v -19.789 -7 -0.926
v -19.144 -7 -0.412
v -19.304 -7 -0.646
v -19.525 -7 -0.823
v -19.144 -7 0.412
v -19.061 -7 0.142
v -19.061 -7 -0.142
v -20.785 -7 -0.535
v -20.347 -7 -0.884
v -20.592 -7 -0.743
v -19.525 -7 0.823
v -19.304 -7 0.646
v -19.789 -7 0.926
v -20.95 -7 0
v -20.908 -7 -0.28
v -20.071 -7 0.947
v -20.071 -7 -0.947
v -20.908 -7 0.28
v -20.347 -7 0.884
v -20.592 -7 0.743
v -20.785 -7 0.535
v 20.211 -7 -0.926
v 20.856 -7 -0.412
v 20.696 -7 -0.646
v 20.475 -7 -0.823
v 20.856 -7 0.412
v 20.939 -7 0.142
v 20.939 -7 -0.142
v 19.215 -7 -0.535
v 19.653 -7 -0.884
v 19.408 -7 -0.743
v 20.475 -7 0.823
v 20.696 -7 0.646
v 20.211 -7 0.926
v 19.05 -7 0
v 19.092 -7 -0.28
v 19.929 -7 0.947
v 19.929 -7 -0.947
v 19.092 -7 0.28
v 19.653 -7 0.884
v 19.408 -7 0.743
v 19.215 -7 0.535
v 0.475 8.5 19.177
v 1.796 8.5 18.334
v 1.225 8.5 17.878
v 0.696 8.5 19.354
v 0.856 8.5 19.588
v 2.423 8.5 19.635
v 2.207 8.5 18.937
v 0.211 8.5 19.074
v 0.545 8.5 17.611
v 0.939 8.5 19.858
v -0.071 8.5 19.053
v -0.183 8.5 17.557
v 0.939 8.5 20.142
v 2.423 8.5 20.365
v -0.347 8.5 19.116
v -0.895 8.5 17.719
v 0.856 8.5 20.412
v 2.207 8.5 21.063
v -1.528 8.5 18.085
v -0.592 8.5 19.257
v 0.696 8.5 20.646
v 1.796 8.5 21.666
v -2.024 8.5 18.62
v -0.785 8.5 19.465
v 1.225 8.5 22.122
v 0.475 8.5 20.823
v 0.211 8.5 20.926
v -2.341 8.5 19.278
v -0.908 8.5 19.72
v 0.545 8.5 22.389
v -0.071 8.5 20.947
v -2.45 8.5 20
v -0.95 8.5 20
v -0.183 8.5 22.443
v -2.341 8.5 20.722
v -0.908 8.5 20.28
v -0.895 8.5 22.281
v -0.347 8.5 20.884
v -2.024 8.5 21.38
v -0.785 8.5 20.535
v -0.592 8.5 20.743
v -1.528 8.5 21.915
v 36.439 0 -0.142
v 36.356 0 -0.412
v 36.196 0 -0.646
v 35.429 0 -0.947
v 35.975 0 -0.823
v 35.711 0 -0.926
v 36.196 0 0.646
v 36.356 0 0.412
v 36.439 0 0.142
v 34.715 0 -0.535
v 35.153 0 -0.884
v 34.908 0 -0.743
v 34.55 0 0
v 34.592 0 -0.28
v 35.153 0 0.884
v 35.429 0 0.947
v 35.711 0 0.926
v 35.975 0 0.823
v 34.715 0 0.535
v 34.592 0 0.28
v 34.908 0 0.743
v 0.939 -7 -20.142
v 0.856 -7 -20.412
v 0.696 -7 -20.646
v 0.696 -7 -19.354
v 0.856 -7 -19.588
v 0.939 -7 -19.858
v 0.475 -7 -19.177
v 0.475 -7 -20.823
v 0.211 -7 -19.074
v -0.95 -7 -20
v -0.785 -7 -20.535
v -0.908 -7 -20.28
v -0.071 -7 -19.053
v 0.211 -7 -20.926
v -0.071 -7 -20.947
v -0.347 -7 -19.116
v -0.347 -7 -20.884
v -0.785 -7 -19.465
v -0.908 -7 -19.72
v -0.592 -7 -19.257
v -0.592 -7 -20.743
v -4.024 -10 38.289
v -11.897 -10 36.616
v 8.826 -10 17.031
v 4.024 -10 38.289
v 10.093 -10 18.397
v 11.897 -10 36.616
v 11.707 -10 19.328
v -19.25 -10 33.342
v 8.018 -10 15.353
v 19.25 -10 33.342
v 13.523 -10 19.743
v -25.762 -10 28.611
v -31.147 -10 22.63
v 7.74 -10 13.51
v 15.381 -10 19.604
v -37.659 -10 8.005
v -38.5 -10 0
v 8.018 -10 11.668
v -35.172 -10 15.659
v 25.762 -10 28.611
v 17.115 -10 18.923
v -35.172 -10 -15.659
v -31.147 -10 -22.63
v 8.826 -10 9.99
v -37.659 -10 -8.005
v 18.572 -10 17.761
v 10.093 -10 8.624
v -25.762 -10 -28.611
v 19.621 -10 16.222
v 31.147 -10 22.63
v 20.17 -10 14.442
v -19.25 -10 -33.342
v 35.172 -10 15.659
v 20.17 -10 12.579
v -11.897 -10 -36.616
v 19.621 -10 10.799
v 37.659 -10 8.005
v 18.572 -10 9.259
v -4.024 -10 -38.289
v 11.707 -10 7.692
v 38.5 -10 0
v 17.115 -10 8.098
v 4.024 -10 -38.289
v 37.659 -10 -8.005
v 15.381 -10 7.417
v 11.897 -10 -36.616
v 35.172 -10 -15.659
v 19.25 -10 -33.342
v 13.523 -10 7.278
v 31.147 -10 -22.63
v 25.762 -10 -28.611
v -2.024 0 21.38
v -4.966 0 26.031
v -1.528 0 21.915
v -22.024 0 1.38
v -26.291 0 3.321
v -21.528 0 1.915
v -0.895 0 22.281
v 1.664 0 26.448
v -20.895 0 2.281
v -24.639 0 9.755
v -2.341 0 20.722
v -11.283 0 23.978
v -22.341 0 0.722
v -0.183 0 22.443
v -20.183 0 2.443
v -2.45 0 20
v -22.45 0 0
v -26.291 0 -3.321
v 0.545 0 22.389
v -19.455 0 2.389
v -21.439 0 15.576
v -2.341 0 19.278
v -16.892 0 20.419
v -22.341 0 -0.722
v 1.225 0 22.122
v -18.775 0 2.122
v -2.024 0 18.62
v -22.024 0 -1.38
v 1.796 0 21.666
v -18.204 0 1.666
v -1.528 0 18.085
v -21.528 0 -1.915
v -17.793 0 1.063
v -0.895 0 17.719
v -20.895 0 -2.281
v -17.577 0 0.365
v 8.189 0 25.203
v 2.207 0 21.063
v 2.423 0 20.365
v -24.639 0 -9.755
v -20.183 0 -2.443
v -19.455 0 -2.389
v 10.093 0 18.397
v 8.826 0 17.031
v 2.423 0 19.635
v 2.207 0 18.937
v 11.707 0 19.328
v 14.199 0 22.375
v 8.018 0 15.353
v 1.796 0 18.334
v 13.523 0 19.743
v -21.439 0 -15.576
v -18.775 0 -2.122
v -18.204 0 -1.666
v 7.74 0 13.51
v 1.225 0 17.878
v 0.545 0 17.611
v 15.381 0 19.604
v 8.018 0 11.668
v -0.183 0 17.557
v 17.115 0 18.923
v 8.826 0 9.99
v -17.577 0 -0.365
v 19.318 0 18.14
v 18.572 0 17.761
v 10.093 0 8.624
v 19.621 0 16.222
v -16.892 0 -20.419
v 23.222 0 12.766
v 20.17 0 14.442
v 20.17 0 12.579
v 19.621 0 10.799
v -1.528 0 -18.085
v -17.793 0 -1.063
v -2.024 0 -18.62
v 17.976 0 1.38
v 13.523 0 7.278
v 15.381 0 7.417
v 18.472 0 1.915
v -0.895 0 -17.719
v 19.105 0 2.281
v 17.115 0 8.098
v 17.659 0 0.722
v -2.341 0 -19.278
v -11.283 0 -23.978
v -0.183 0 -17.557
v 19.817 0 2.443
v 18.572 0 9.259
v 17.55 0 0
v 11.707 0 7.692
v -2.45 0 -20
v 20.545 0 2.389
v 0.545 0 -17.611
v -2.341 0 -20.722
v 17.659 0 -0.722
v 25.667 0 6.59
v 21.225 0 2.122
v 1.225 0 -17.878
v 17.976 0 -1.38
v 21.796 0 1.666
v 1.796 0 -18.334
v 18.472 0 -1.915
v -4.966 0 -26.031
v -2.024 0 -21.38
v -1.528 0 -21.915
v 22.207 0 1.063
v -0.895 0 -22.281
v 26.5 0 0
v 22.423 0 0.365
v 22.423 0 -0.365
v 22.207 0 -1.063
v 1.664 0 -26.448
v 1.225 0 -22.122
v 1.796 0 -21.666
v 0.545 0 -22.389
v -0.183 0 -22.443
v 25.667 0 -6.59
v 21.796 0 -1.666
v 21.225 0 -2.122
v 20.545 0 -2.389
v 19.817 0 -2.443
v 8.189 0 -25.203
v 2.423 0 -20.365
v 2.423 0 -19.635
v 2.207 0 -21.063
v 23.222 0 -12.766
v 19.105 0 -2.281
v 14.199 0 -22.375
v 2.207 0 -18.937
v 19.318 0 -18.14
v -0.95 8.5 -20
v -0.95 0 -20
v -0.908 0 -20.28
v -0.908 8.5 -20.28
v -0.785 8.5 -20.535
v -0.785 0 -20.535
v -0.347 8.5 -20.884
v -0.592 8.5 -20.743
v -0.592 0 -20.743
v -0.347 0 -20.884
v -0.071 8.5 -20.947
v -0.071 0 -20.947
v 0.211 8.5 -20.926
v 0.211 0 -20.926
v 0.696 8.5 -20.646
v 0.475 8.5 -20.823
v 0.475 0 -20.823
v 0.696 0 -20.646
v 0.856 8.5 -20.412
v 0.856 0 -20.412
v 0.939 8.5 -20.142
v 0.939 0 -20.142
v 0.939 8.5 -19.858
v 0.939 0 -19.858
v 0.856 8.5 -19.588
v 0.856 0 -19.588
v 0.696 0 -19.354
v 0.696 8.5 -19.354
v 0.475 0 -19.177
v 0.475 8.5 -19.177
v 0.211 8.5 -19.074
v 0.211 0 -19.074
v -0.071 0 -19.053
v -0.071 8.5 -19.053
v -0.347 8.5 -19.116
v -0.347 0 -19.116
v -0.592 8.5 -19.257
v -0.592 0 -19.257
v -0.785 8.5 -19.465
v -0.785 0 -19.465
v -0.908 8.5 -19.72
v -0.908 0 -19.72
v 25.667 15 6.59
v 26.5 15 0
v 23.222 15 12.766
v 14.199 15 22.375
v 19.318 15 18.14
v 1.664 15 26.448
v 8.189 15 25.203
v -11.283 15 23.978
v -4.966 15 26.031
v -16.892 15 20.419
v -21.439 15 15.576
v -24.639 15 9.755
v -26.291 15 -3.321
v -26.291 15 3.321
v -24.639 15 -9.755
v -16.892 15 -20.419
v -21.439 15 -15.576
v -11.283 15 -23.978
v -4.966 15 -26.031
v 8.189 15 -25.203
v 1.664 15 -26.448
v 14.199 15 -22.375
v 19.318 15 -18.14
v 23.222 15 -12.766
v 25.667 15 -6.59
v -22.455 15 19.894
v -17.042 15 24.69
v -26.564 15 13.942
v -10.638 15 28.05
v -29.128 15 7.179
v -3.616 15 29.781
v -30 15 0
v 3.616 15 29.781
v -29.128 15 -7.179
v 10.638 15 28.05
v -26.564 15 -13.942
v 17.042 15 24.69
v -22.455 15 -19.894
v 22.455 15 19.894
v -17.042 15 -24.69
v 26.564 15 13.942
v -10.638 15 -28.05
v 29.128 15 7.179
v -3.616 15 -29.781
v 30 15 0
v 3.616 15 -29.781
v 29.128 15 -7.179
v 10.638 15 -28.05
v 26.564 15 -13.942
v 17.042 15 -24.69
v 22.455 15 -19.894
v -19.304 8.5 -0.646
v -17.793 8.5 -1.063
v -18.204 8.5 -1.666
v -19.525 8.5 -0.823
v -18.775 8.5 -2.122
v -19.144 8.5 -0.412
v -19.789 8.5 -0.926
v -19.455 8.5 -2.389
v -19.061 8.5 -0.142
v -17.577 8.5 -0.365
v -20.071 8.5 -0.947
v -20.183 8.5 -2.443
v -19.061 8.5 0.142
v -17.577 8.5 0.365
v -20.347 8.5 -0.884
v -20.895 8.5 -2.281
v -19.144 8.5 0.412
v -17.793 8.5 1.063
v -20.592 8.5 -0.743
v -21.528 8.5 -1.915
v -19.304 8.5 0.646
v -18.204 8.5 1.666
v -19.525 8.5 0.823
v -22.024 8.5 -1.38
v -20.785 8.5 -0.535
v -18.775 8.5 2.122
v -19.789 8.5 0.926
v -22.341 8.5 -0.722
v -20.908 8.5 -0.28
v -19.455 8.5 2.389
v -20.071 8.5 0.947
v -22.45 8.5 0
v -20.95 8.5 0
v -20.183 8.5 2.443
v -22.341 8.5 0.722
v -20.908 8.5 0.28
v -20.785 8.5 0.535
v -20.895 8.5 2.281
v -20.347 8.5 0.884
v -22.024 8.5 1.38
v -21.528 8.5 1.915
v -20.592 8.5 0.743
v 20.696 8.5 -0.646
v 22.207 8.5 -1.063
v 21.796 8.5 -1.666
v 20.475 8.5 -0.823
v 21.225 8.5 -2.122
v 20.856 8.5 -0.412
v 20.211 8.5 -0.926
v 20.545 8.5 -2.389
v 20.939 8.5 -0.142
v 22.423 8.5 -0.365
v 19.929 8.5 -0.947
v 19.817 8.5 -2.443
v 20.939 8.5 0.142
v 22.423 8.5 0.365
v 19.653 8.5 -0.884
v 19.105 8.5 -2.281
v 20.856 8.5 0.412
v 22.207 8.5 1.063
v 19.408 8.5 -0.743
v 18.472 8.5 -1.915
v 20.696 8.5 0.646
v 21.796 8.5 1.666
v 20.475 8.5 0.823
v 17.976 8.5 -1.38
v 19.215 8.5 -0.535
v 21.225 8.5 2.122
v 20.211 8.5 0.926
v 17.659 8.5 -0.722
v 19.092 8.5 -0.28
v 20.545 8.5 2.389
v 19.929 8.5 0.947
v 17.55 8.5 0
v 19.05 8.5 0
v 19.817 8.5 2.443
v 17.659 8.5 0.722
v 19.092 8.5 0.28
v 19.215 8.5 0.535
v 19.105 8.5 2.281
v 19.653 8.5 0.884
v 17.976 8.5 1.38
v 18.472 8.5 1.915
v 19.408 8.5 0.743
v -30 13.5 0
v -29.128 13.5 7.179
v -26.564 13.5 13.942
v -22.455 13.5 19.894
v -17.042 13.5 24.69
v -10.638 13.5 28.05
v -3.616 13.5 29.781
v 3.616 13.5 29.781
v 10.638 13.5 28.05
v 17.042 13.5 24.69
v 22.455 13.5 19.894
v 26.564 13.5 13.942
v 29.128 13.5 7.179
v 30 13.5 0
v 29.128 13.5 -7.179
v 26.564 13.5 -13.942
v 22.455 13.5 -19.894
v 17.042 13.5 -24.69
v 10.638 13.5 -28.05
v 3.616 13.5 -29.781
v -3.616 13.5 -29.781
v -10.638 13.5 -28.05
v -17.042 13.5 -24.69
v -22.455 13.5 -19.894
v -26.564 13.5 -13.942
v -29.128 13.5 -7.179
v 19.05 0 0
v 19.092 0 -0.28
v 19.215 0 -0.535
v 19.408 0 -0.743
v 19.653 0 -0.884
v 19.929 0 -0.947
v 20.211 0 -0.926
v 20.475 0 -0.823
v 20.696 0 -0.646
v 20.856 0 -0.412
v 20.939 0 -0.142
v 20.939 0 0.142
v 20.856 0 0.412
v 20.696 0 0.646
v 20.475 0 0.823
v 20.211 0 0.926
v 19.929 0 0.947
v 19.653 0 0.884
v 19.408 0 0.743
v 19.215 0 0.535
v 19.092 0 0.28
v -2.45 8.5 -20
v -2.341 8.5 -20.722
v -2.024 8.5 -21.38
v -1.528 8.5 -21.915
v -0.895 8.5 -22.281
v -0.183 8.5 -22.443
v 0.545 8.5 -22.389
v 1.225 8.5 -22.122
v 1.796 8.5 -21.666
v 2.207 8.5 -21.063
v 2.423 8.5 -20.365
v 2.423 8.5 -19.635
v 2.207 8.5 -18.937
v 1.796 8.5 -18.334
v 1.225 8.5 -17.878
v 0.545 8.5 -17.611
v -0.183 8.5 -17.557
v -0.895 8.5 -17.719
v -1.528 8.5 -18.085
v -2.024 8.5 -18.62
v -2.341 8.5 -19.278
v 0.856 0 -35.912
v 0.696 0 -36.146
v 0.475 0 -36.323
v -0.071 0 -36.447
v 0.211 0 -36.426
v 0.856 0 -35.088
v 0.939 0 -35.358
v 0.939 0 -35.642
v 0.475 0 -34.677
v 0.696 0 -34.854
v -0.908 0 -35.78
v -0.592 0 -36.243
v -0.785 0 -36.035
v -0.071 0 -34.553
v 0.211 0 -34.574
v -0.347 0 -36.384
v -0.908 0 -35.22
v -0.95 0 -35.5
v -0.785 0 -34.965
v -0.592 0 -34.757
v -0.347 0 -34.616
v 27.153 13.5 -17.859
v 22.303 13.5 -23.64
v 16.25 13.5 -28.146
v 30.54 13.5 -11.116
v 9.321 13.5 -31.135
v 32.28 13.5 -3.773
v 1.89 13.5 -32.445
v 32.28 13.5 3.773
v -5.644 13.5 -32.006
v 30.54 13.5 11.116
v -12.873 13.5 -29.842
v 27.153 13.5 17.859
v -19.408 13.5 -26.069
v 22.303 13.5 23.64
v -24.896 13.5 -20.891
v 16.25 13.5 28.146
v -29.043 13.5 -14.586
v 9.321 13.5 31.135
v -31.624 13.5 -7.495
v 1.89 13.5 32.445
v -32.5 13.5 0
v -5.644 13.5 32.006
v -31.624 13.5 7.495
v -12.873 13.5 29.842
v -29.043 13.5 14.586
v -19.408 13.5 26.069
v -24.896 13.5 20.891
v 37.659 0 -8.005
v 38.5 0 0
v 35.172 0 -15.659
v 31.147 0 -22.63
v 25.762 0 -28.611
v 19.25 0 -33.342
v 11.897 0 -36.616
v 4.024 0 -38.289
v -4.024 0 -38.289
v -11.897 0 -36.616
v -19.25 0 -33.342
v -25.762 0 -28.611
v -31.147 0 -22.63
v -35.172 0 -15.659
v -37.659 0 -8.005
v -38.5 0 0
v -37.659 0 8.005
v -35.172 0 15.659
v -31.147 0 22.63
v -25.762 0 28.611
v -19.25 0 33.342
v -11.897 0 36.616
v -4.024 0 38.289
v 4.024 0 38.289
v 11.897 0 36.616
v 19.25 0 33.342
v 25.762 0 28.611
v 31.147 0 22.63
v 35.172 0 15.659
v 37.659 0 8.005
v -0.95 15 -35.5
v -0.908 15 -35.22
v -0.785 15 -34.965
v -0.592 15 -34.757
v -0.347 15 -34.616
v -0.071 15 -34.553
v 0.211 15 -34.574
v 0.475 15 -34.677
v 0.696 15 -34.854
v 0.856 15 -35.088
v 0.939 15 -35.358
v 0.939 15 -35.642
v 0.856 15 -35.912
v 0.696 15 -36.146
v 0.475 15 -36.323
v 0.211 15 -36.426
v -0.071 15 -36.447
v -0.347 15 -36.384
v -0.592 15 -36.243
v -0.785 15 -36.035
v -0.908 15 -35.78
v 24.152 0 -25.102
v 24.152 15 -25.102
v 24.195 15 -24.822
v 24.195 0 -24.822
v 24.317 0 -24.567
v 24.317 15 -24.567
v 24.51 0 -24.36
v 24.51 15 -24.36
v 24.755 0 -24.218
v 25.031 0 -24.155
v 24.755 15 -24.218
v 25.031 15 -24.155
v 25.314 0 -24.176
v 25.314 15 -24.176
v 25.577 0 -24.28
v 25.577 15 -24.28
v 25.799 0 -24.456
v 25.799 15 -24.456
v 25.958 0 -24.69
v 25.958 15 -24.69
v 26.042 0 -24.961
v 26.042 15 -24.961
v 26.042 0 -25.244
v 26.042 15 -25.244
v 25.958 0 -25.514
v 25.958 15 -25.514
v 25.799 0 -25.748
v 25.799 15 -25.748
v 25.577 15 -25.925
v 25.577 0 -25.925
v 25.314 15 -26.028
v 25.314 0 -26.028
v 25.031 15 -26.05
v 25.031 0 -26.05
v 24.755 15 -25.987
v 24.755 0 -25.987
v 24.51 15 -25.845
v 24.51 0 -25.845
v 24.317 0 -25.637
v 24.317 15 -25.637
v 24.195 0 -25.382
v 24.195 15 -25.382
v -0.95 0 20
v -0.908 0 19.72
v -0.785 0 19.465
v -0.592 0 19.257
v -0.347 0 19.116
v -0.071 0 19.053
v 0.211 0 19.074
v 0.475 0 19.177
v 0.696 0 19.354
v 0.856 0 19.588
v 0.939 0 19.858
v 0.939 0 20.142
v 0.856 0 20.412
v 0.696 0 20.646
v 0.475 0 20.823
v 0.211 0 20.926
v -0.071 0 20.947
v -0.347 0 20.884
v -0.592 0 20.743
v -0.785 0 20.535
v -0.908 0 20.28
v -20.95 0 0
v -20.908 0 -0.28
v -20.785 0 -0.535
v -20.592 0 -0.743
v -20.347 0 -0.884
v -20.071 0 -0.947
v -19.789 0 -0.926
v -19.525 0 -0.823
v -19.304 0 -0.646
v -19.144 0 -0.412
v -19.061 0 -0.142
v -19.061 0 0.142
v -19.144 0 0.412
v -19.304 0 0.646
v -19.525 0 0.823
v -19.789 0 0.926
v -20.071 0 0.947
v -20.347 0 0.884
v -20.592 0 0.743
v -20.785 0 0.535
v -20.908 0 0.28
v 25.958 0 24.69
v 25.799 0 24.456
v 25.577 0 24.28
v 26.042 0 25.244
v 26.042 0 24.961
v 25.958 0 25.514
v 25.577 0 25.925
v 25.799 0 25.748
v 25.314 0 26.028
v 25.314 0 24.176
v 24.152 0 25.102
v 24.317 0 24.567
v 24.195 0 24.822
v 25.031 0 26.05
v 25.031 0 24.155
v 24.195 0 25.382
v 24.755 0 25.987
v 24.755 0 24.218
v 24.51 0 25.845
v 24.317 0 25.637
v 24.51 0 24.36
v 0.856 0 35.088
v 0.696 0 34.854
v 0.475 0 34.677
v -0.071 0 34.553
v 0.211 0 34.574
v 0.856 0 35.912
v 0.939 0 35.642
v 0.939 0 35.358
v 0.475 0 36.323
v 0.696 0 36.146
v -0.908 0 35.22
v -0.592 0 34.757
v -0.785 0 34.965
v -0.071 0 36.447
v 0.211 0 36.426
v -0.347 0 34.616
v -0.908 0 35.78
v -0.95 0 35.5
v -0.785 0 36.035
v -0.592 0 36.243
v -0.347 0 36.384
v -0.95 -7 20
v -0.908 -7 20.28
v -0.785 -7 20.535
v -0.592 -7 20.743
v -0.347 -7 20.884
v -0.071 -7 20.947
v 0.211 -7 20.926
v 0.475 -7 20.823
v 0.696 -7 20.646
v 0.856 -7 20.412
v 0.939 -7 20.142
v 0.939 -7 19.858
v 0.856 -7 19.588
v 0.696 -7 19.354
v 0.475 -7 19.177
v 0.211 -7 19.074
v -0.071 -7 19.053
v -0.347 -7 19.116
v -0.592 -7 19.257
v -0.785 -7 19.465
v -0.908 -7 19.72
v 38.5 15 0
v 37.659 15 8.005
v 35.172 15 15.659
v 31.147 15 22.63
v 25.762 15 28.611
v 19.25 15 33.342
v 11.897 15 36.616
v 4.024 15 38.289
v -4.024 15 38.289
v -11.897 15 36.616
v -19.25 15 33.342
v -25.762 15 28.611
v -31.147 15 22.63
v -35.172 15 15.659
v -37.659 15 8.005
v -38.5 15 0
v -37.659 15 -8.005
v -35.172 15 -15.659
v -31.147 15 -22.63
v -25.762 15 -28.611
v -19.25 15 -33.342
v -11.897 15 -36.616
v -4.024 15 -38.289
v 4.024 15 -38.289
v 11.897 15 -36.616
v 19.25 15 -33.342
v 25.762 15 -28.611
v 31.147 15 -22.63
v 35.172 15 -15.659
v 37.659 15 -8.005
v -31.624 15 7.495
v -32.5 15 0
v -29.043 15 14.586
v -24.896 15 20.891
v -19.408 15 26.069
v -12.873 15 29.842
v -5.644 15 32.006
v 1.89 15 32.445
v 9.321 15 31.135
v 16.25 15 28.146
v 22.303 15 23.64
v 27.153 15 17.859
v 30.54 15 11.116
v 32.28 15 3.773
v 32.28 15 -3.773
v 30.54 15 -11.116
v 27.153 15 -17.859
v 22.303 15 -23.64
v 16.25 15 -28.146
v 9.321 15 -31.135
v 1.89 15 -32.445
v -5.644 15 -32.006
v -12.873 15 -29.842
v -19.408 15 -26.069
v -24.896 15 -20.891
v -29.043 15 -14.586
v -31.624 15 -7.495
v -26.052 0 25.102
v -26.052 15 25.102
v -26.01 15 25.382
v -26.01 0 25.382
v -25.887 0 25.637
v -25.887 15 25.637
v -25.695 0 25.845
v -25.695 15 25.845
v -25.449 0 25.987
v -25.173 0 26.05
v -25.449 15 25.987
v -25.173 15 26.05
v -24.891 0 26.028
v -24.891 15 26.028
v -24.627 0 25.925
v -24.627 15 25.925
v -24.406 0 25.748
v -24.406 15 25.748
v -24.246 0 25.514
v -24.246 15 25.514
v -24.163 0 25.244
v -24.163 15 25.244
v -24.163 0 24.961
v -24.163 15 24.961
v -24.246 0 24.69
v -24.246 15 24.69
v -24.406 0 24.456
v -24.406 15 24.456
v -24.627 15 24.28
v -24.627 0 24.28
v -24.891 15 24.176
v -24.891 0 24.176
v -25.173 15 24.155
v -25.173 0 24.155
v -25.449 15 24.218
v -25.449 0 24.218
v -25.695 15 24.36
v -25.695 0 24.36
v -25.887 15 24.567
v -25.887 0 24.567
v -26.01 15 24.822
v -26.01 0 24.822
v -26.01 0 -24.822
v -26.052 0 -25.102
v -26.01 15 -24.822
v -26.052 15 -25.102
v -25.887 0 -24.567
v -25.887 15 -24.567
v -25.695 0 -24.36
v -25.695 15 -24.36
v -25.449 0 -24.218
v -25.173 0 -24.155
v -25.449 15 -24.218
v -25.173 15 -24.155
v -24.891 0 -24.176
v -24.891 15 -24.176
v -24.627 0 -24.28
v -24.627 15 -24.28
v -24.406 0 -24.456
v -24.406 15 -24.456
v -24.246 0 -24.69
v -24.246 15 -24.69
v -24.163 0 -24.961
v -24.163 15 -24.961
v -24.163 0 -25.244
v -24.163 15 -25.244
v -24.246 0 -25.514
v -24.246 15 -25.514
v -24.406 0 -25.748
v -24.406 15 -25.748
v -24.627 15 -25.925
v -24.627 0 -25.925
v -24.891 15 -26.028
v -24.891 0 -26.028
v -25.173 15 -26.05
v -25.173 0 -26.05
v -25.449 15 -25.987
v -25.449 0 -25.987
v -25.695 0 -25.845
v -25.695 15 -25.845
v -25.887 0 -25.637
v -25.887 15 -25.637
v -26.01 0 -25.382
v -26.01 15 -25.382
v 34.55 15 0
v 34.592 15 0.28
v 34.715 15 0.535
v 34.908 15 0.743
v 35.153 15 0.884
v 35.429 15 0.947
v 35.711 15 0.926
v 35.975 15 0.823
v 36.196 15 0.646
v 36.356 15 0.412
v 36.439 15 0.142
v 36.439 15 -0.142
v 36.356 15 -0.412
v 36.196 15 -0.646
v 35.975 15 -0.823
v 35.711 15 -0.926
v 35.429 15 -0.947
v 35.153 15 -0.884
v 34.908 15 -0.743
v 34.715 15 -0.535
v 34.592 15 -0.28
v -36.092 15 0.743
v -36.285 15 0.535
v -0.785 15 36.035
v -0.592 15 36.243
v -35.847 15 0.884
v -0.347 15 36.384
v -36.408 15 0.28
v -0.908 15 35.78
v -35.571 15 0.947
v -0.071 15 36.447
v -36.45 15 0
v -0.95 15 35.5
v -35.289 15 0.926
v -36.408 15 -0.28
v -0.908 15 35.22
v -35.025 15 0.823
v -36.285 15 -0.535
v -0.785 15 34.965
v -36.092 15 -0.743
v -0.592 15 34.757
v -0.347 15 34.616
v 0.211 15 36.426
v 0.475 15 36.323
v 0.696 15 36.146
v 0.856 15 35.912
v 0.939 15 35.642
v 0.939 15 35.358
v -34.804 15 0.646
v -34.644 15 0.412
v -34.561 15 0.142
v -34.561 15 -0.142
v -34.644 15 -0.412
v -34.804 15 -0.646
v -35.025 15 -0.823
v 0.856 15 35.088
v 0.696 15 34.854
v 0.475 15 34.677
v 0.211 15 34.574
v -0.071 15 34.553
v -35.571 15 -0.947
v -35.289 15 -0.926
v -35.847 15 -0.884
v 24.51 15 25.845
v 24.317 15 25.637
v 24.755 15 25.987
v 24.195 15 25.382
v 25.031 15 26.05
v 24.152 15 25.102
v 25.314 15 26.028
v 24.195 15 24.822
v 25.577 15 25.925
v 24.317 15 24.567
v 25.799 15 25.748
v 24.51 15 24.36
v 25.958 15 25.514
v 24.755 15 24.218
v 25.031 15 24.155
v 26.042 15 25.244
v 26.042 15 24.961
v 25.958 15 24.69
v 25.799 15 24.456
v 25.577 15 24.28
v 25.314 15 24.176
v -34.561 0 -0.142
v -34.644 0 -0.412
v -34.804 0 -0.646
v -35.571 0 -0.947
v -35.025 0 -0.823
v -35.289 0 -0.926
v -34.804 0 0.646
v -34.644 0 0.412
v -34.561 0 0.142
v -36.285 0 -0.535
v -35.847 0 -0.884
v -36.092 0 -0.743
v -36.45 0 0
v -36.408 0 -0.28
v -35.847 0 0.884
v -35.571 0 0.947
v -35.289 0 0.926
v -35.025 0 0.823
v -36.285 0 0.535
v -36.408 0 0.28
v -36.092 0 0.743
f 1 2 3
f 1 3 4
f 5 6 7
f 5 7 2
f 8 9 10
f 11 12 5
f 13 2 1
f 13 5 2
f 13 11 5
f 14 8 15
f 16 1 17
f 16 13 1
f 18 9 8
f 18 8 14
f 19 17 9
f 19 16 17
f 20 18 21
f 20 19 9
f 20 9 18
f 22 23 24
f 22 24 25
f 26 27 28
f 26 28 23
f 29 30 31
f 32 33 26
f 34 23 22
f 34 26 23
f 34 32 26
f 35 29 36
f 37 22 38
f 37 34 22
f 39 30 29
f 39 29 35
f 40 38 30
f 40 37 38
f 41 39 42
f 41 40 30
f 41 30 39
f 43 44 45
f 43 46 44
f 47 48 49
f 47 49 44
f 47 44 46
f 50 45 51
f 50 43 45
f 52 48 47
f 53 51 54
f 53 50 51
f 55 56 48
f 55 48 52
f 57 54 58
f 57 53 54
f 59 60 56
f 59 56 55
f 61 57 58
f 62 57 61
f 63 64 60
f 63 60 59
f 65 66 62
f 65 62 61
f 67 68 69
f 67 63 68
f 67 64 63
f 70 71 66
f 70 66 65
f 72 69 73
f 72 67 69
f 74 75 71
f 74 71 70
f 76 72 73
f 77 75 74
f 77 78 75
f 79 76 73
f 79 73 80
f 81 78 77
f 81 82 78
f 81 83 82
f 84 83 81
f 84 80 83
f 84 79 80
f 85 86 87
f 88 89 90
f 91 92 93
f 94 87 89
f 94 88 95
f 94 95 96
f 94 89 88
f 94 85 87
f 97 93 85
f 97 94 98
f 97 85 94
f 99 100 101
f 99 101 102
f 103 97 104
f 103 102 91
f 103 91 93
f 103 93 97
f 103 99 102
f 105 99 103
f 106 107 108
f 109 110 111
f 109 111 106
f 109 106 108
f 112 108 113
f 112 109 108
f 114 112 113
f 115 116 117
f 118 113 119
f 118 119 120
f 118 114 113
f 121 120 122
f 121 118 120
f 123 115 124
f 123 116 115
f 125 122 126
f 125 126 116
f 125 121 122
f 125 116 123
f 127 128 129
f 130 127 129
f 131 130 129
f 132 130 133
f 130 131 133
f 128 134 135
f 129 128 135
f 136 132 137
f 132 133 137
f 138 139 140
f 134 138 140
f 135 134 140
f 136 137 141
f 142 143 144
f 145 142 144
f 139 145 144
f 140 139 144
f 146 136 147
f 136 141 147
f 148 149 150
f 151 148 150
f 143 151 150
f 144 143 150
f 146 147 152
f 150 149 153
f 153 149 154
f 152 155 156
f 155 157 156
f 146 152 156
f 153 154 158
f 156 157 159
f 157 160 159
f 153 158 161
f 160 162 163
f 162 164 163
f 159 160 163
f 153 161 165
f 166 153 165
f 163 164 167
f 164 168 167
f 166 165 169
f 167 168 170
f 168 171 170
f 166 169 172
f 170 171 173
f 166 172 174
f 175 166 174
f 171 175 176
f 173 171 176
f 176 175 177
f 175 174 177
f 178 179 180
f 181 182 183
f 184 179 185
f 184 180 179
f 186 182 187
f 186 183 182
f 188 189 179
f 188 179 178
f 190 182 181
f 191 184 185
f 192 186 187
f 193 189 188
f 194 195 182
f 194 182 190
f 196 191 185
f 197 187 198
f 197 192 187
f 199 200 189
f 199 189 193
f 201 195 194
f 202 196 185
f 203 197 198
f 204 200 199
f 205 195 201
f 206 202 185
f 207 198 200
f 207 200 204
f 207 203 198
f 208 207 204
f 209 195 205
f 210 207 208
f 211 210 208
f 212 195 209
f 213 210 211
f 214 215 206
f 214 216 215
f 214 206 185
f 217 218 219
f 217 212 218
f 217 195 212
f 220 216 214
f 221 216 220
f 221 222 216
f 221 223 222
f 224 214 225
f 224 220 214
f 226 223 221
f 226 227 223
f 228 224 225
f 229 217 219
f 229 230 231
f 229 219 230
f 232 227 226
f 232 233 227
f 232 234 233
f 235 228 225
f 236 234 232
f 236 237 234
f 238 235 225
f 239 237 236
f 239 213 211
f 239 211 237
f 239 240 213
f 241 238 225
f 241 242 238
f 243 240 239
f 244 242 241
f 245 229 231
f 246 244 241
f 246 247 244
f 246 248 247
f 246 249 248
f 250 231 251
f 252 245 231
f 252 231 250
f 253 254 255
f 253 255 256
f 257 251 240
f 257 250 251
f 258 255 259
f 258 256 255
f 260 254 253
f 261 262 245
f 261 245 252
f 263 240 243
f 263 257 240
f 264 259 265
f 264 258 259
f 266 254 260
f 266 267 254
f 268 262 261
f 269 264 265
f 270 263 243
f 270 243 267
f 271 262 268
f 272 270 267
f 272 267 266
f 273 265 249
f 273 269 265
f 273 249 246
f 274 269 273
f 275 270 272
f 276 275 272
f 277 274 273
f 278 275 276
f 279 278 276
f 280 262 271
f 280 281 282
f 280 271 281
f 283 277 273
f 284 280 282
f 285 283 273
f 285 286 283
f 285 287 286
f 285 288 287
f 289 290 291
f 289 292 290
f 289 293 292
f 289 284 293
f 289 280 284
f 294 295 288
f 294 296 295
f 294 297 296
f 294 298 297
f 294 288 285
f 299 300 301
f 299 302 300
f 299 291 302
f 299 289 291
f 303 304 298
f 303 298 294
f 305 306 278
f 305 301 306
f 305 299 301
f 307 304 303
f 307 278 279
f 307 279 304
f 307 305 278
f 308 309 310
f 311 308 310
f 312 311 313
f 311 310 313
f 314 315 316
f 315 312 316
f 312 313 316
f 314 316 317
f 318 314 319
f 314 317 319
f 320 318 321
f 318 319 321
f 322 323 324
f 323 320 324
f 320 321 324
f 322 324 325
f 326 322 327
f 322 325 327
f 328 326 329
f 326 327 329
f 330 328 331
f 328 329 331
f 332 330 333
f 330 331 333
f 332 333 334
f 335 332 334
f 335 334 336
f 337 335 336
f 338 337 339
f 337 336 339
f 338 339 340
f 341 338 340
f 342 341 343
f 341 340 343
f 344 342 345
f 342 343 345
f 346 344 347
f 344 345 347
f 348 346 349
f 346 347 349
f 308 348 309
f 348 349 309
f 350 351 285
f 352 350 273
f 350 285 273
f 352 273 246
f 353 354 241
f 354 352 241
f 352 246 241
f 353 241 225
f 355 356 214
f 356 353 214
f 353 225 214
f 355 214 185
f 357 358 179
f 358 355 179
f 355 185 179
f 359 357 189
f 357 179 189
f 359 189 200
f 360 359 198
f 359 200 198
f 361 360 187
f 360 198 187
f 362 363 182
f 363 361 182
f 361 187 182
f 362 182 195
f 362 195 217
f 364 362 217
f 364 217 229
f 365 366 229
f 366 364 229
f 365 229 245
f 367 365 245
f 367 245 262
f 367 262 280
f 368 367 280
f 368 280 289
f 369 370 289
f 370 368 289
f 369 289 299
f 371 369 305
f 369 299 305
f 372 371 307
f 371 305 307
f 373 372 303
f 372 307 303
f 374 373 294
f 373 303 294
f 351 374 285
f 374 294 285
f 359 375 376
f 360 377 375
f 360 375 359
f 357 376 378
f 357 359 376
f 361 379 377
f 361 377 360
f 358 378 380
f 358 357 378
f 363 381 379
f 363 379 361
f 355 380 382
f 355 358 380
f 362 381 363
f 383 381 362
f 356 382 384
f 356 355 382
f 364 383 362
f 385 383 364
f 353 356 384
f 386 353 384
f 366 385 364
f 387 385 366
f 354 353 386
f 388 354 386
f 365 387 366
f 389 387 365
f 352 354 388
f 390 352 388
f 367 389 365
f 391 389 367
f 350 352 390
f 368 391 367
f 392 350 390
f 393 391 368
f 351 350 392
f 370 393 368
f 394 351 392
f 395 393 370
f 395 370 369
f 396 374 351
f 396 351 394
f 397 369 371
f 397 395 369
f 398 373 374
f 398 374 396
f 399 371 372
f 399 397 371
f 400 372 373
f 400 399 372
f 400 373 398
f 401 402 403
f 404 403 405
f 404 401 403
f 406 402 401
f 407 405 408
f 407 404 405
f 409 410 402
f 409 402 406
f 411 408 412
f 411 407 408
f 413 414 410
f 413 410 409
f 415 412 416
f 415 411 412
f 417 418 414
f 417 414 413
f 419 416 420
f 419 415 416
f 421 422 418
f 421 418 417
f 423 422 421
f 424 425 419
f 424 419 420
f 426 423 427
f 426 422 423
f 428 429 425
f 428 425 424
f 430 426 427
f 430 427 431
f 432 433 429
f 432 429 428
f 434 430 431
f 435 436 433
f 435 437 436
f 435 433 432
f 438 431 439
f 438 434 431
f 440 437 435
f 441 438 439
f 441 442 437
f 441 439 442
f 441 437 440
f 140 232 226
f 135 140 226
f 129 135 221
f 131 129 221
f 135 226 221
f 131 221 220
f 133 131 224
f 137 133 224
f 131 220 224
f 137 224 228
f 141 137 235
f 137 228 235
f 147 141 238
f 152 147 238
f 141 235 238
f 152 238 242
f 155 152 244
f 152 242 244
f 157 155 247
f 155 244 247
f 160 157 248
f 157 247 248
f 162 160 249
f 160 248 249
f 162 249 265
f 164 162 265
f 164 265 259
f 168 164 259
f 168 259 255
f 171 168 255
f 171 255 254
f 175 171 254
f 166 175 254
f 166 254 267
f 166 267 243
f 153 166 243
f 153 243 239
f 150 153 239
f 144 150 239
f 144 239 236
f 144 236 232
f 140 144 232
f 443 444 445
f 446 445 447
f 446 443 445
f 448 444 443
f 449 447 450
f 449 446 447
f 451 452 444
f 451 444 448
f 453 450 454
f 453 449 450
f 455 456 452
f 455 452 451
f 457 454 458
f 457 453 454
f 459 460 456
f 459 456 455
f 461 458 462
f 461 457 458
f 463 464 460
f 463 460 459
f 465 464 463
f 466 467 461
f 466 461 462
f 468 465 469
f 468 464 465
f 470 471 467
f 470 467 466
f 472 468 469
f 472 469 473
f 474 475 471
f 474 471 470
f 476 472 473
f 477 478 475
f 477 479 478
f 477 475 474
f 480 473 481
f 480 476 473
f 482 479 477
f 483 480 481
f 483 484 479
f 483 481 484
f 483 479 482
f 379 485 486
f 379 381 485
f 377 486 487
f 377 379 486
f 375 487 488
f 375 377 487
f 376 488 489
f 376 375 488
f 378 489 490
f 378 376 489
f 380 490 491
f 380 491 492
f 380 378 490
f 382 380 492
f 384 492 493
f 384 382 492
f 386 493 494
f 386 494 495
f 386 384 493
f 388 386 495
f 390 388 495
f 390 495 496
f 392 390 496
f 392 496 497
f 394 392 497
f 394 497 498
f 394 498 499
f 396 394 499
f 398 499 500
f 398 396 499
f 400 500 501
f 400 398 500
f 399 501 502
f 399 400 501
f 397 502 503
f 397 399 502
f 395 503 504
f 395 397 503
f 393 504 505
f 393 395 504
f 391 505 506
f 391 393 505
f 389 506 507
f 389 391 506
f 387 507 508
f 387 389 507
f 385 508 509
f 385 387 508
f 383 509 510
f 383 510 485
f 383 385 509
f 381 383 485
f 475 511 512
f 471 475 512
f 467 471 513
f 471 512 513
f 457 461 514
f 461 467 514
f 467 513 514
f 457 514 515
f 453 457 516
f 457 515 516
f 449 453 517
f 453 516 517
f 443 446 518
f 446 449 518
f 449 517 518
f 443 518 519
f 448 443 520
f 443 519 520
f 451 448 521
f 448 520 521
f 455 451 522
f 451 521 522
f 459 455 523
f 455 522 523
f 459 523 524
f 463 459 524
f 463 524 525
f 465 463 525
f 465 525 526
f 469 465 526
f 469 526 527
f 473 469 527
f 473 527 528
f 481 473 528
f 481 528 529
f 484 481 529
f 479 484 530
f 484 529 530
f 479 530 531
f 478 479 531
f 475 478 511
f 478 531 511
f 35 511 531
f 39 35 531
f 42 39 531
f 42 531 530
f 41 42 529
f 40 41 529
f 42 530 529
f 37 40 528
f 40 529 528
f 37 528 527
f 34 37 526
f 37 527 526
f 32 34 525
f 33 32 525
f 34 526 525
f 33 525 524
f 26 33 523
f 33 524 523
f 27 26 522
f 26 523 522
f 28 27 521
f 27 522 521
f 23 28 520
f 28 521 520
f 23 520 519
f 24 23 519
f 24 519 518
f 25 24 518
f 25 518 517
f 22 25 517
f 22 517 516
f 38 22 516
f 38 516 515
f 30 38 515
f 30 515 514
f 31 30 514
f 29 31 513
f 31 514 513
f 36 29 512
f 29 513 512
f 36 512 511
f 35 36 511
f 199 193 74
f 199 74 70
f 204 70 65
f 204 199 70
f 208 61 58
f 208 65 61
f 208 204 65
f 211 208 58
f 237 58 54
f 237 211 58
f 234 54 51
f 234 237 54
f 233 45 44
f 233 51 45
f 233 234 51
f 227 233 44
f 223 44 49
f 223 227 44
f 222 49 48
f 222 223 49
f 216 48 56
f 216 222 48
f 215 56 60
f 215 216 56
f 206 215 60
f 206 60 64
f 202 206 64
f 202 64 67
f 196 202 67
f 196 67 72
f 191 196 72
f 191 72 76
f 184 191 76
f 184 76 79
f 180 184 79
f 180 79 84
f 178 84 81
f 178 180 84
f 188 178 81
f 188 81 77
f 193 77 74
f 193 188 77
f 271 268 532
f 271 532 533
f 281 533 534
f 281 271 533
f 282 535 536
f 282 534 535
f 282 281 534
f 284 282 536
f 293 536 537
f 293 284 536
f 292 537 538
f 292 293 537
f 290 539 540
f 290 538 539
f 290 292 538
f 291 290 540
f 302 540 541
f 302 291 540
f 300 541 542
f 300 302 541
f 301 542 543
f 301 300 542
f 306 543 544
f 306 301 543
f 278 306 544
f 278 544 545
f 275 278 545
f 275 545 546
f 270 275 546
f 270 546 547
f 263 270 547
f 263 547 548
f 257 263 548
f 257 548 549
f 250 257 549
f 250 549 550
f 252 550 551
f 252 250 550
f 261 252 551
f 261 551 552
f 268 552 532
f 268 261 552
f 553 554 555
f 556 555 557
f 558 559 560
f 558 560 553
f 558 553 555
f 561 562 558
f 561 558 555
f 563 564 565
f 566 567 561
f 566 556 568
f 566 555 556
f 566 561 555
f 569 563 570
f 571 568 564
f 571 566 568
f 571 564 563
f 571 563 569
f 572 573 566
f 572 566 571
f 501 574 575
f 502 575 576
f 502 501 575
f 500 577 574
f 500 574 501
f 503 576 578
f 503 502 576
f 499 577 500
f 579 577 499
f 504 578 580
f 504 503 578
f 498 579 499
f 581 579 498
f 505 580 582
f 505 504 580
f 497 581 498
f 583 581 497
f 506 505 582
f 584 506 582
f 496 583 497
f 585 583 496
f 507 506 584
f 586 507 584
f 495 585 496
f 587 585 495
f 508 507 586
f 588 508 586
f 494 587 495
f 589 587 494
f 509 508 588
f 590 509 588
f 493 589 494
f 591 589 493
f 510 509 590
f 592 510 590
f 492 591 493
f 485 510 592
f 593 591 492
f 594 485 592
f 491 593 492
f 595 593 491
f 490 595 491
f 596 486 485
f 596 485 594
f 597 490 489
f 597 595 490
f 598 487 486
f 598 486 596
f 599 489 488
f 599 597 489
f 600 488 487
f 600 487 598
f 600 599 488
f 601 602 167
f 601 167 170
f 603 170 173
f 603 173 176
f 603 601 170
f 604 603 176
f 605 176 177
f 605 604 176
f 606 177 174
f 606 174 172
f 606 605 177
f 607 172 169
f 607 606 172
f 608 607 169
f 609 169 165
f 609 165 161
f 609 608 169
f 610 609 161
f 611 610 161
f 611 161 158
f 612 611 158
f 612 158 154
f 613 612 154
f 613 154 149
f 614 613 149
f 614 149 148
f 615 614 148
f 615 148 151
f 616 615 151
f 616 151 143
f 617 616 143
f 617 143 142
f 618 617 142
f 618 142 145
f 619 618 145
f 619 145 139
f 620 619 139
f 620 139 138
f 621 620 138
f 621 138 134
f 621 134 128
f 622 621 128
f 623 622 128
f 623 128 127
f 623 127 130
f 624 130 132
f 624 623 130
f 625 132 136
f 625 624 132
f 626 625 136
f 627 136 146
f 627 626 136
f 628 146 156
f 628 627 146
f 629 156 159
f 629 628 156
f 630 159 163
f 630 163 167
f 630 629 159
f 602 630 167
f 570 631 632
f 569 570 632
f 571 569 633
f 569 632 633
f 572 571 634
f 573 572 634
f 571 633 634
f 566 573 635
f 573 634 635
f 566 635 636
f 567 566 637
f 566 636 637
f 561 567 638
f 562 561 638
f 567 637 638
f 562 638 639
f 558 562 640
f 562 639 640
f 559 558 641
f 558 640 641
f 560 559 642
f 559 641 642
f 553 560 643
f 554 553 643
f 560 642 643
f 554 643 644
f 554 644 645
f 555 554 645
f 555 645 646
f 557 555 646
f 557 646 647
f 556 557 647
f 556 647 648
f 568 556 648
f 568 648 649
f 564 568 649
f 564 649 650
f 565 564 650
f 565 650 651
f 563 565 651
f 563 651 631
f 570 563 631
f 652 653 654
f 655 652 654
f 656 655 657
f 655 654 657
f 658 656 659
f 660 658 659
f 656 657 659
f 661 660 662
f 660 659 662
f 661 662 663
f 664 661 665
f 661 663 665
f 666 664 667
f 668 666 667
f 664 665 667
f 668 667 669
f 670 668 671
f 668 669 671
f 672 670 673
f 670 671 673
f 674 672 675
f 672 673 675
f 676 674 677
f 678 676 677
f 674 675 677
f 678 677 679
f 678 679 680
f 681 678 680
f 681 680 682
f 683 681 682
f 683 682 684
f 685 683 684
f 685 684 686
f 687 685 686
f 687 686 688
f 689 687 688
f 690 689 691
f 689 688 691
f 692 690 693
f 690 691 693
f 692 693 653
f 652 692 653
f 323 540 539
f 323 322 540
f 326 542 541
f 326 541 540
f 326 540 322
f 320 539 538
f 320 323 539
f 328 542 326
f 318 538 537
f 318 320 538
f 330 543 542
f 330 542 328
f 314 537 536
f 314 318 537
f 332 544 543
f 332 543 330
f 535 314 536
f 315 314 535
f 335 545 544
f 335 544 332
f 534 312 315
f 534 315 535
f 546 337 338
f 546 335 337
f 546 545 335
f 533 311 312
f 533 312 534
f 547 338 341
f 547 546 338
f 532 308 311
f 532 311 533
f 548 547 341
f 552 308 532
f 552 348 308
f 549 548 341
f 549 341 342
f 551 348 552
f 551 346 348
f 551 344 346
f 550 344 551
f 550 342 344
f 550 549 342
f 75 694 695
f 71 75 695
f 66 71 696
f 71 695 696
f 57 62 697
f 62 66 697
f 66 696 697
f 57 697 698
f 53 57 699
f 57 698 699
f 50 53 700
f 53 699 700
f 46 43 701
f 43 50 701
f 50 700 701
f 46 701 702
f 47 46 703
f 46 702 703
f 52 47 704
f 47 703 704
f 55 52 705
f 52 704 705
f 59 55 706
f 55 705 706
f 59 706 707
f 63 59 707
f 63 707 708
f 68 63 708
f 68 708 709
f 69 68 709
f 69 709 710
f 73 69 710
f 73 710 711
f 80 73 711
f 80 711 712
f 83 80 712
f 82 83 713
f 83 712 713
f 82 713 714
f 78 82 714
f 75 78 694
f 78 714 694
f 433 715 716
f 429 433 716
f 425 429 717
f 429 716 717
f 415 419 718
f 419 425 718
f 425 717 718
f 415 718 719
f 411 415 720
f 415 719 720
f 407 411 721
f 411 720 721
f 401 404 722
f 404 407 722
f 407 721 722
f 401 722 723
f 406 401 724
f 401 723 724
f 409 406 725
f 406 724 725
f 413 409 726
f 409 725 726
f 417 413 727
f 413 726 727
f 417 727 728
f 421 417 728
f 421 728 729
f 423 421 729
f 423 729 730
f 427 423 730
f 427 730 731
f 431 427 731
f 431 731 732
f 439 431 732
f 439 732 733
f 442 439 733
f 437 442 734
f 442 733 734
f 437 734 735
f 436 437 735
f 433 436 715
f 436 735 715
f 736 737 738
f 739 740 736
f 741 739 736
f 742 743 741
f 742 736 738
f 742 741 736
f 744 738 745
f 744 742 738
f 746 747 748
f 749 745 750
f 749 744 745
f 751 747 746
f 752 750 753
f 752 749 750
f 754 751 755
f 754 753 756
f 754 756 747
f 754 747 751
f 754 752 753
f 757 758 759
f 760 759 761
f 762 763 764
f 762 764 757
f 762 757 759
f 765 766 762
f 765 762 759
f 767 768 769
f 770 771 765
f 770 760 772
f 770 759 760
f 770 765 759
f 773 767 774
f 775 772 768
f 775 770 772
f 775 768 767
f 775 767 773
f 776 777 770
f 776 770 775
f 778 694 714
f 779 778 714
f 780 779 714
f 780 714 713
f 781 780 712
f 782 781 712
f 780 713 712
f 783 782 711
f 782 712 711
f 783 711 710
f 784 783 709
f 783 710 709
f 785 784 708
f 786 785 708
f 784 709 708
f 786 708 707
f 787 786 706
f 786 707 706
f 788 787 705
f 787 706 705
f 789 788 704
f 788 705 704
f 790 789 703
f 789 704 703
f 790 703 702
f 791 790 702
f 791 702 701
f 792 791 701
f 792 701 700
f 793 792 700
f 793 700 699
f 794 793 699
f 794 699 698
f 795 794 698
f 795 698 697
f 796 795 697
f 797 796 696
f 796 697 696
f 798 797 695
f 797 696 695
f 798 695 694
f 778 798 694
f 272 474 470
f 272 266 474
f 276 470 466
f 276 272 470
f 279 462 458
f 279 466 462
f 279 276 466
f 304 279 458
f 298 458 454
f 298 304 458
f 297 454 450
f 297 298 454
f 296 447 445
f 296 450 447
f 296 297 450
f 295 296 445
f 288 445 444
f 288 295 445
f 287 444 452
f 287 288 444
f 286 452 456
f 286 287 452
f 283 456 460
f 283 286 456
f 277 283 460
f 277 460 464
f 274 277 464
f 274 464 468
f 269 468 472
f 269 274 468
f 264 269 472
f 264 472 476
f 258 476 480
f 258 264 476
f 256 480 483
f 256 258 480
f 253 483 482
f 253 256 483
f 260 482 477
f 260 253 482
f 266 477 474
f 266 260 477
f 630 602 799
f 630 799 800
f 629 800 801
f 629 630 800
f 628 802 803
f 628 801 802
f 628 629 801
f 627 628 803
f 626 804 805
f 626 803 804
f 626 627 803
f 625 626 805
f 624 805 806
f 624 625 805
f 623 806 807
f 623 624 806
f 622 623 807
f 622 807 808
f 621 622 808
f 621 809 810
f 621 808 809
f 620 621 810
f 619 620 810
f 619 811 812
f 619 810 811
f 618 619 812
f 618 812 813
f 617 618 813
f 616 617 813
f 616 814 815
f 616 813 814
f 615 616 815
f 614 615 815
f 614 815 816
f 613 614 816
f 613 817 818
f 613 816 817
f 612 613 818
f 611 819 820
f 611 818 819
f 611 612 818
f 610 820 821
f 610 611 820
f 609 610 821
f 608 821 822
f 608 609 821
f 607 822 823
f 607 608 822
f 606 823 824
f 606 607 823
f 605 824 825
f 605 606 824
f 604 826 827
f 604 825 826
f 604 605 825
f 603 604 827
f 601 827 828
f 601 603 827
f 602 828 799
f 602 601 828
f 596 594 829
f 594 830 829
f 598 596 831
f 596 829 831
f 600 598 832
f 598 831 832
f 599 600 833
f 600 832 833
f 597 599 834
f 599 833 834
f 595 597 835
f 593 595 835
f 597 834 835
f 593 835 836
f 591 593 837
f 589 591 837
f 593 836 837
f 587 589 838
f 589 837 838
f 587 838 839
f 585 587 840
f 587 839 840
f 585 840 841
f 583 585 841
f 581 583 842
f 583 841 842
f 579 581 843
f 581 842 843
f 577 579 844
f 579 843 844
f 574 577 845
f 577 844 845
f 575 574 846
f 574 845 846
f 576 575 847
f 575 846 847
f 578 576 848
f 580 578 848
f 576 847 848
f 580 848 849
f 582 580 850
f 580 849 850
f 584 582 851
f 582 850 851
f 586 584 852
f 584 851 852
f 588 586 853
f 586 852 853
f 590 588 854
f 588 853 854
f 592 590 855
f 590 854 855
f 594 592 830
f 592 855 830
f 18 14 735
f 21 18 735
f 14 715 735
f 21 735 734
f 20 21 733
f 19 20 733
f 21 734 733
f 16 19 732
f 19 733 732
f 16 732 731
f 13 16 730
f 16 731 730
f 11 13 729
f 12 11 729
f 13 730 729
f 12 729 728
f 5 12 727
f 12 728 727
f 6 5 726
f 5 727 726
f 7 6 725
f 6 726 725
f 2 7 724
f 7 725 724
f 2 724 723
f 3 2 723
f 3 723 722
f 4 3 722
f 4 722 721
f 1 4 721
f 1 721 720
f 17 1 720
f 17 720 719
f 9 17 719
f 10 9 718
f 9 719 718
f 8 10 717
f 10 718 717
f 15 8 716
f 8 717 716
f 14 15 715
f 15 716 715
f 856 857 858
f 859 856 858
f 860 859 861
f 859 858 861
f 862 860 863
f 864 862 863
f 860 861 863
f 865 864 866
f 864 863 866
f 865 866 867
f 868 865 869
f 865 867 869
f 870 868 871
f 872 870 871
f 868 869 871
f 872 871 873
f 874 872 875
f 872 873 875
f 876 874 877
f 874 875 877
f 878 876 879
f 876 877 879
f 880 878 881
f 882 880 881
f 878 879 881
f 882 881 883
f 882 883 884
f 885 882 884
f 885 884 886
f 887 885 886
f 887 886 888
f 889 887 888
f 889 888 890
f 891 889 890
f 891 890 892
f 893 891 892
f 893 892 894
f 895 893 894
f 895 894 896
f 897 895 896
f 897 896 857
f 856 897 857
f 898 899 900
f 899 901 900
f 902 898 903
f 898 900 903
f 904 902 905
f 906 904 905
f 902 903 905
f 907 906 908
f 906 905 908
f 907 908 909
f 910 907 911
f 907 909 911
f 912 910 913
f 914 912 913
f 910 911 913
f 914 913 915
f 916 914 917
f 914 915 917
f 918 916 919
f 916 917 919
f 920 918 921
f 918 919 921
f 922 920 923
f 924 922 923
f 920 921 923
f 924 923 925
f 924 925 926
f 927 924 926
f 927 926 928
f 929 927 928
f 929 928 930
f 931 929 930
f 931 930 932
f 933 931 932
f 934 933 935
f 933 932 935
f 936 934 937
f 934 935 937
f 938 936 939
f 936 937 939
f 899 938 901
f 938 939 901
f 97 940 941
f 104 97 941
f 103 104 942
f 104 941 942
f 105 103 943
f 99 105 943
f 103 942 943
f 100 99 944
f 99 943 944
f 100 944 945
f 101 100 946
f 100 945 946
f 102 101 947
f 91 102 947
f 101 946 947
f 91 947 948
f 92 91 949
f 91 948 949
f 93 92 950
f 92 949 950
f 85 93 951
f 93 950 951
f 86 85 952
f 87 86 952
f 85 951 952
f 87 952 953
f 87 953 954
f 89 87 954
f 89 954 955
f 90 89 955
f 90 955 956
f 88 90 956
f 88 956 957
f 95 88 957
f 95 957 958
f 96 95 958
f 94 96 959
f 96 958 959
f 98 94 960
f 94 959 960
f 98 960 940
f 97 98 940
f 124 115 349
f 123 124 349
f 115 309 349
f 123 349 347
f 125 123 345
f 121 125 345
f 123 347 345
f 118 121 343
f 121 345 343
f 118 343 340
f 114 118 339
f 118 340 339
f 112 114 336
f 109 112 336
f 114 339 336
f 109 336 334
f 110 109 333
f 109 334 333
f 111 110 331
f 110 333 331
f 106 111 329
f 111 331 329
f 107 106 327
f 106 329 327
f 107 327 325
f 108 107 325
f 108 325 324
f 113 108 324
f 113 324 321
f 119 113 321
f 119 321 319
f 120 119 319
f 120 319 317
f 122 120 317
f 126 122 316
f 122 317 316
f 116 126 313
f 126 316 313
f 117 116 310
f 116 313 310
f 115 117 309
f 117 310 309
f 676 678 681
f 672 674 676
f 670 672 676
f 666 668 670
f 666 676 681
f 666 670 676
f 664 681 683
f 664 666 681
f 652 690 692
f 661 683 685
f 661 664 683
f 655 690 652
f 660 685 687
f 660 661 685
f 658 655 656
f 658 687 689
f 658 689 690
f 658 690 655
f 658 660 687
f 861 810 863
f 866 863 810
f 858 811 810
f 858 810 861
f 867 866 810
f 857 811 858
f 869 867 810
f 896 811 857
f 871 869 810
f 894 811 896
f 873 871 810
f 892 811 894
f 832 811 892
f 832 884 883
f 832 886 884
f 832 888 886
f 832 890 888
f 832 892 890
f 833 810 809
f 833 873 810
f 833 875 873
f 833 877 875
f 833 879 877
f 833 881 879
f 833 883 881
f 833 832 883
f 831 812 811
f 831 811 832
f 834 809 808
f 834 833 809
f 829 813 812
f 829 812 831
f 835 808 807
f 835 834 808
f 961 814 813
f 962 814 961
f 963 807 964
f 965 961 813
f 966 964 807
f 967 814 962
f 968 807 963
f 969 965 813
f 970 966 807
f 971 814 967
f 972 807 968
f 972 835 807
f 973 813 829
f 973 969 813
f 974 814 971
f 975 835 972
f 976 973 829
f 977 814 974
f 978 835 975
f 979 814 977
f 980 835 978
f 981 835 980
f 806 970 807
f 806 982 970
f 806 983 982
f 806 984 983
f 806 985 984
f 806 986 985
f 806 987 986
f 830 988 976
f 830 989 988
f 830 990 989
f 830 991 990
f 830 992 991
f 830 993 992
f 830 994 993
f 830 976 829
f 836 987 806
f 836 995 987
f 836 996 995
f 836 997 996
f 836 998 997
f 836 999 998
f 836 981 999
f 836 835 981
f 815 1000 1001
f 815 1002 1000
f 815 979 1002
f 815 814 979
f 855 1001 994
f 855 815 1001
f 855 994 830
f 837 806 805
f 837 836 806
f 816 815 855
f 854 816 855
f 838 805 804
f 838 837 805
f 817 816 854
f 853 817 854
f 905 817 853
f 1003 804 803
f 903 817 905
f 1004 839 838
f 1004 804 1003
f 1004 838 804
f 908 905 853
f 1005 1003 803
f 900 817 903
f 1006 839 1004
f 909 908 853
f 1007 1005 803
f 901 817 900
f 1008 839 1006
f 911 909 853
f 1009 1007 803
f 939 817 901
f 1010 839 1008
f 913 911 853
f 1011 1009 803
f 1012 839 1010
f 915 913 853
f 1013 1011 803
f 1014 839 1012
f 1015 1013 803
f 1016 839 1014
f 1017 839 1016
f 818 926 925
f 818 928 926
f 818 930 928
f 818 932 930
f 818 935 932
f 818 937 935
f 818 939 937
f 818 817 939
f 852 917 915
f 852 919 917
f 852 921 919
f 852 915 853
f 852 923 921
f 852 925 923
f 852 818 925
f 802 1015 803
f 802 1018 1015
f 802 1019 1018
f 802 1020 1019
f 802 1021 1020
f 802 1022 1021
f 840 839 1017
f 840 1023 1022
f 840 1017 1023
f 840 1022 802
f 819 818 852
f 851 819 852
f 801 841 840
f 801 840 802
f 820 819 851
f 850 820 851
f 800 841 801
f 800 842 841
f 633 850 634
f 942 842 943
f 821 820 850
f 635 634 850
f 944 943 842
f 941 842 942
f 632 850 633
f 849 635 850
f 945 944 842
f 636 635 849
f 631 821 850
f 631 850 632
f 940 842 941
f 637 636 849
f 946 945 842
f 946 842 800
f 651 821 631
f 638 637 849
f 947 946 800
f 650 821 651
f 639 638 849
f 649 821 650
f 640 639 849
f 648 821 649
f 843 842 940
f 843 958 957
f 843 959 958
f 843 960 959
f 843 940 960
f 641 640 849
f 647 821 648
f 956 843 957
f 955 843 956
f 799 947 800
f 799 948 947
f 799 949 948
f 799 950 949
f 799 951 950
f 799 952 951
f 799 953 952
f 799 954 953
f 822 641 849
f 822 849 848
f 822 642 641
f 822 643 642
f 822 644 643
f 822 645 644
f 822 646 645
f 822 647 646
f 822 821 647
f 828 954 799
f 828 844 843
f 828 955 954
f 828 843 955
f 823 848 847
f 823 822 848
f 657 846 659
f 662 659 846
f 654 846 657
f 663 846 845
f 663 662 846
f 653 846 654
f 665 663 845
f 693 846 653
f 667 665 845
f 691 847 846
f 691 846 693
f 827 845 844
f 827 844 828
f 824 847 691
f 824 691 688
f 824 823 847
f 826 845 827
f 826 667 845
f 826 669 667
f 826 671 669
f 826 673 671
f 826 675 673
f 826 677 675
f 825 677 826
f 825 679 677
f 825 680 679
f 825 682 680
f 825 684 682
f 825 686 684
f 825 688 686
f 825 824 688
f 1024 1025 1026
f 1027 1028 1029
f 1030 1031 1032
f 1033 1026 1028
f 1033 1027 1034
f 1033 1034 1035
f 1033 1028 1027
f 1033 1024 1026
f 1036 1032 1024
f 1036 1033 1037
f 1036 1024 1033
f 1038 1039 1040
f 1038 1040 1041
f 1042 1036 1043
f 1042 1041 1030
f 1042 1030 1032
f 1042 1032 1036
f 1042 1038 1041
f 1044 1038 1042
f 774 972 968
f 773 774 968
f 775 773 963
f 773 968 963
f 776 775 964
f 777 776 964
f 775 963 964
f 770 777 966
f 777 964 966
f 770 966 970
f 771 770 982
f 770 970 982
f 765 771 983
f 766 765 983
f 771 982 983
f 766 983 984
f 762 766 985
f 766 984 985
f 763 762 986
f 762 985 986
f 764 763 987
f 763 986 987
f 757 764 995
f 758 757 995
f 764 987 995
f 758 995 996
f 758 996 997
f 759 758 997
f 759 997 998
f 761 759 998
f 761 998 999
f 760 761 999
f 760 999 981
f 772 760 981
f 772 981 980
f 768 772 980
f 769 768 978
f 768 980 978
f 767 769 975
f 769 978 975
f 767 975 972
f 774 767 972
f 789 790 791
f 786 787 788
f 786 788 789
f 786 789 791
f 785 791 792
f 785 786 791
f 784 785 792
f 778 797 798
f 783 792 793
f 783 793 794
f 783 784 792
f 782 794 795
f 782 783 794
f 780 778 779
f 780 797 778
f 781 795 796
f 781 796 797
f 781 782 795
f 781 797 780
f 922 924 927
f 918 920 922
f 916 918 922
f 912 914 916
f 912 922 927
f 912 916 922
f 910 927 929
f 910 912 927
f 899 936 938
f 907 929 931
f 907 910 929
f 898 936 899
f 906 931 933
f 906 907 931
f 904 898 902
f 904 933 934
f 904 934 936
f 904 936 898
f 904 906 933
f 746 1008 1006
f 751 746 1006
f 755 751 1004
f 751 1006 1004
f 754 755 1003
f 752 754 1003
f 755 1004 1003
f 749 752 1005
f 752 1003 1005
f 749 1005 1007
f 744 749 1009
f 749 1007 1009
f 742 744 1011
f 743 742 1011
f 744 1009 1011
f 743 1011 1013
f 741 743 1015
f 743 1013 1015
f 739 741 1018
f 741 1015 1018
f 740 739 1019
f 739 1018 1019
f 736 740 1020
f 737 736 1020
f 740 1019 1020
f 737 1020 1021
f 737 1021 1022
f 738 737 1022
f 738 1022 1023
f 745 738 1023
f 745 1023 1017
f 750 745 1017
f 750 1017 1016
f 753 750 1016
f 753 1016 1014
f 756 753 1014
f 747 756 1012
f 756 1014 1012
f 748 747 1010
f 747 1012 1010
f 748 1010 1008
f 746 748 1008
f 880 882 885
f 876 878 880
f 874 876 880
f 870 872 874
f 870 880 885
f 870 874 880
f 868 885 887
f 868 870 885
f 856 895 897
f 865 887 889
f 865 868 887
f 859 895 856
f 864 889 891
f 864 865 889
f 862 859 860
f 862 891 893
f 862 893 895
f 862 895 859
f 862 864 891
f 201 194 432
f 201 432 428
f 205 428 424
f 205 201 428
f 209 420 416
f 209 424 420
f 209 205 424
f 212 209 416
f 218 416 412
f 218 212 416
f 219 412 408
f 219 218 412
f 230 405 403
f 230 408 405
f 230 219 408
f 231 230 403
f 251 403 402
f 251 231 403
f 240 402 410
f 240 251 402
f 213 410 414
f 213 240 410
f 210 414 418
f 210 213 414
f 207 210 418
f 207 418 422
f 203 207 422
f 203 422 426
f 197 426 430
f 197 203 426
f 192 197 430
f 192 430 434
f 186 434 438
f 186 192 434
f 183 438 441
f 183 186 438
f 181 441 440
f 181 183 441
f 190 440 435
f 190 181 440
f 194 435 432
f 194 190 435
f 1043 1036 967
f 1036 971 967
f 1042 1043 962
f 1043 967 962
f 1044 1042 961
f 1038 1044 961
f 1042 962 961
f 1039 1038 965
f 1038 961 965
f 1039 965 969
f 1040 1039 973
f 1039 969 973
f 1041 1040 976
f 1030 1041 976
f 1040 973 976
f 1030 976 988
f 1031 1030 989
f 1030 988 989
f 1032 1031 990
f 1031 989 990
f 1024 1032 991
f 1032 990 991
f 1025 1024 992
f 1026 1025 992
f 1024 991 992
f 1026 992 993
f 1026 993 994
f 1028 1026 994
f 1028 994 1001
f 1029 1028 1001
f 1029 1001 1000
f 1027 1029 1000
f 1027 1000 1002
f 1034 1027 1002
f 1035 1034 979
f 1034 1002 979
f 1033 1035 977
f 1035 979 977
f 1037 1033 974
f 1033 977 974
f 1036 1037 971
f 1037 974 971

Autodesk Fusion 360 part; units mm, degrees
sketch "BaseSketch" plane through (0, 0, 0) normal (0, 1, 0) x (1, 0, 0)
  circle A0 centre (0, 0) radius 38.5
  circle A1 centre (0, 0) radius 26.5
  dimension "d1" = 77
  dimension "d2" = 53
extrude "Extrude1" add sketch "BaseSketch" against normal blind 10 contours A0 | A1
extrude "Extrude2" add sketch "BaseSketch" along normal blind 15
sketch "ORingSketch" plane through (0, 15, 0) normal (0, 1, 0) x (-1, 0, 0)
  circle A0 centre (0, 0) radius 26.5
  circle A1 centre (0, 0) radius 38.5
  circle A2 centre (0, 0) radius 30
  circle A3 centre (0, 0) radius 32.5
  dimension "d10" = 60
  dimension "d11" = 65
extrude "Extrude3" cut sketch "ORingSketch" against normal blind 1.5 contours A3
sketch "ScrewSketch" plane through (0, 15, 0) normal (0, 1, 0) x (-1, 0, 0)
  circle A0 centre (0, 0) radius 38.5
  circle A1 centre (0, 0) radius 32.5
  circle A2 centre (-35.5, 0) radius 0.95
  circle A3 centre (-25.1023, -25.1023) radius 0.95
  circle A4 centre (0, -35.5) radius 0.95
  circle A5 centre (25.1023, -25.1023) radius 0.95
  circle A6 centre (35.5, 0) radius 0.95
  circle A7 centre (25.1023, 25.1023) radius 0.95
  circle A8 centre (0, 35.5) radius 0.95
  circle A9 centre (-25.1023, 25.1023) radius 0.95
  dimension "d16" = 1.9
  dimension "d19" = 360
  dimension "d22" = 35.5
extrude "Extrude4" cut sketch "ScrewSketch" against normal blind 15 contours A2 | A3 | A4 | A5 | A6 | A7 | A8 | A9
sketch "StandoffSketch" plane through (0, 0, 0) normal (0, 1, 0) x (-1, 0, 0)
  circle A0 centre (0, 0) radius 26.5
  circle A1 centre (0, 0) radius 25
  circle A2 centre (-20, 0) radius 0.95
  circle A3 centre (-20, 0) radius 2.45
  circle A4 centre (0, -20) radius 0.95
  circle A5 centre (0, -20) radius 2.45
  circle A6 centre (20, 0) radius 0.95
  circle A7 centre (20, 0) radius 2.45
  circle A8 centre (0, 20) radius 0.95
  circle A9 centre (0, 20) radius 2.45
  dimension "d25" = 50
  dimension "d27" = 1.9
  dimension "d28" = 20
  dimension "d29" = 4.9
  dimension "d31" = 360
extrude "Extrude5" add sketch "StandoffSketch" along normal blind 8.5 contours A3 | A5 | A7 | A9
extrude "Extrude6" cut sketch "StandoffSketch" against normal blind 7 contours A2 | A4 | A6 | A8
ref_plane "WorkPlane1" through (0, 15, 0) normal (0, 1, 0) x (1, 0, 0)
sketch "RubberPlugSketch" plane through (0, 0, 0) normal (0, 1, 0) x (-1, 0, 0)
  circle A0 centre (20, 0) radius 2.45
  circle A1 centre (0, -20) radius 2.45
  circle A2 centre (0, 0) radius 26.5
  circle A3 centre (-20, 0) radius 2.45
  circle A4 centre (0, 20) radius 2.45
  circle A5 centre (-13.9903, 13.5103) radius 6.25
  line L0 (0, 0) -> (-26.5, 0) construction
  line L1 (0, 0) -> (-13.9903, 13.5103) construction
  dimension "d37" = 12.5
  dimension "d38" = 19.4488
  dimension "d39" = 44
extrude "Extrude7" cut sketch "RubberPlugSketch" against normal blind 10 contours A5
equation "d1 = diameter"
equation "d2 = PCBdiameter + tolerance"
equation "tolerance = 3 mm"
equation "d4 = -CaseBottomThick"
equation "CaseBottomThick = 10 mm"
equation "height = 25 mm"
equation "d8 = height - CaseBottomThick"
equation "d10 = d11 - 5 mm"
equation "diameter = 77 mm"
equation "screwDiameter = 1.9 mm"
equation "d16 = screwDiameter"
equation "screwDepth = 15 mm"
equation "d22 = diameter / 2 - 3 mm"
equation "d23 = -screwDepth"
equation "d25 = PCBdiameter"
equation "PCBdiameter = 50 mm"
equation "d27 = screwDiameter"
equation "d28 = PCBdiameter / 2 - 5 mm"
equation "d29 = screwDiameter + tolerance"
equation "d32 = 5.5 mm + tolerance"
equation "d34 = -CaseBottomThick + tolerance"
equation "d40 = -CaseBottomThick"
